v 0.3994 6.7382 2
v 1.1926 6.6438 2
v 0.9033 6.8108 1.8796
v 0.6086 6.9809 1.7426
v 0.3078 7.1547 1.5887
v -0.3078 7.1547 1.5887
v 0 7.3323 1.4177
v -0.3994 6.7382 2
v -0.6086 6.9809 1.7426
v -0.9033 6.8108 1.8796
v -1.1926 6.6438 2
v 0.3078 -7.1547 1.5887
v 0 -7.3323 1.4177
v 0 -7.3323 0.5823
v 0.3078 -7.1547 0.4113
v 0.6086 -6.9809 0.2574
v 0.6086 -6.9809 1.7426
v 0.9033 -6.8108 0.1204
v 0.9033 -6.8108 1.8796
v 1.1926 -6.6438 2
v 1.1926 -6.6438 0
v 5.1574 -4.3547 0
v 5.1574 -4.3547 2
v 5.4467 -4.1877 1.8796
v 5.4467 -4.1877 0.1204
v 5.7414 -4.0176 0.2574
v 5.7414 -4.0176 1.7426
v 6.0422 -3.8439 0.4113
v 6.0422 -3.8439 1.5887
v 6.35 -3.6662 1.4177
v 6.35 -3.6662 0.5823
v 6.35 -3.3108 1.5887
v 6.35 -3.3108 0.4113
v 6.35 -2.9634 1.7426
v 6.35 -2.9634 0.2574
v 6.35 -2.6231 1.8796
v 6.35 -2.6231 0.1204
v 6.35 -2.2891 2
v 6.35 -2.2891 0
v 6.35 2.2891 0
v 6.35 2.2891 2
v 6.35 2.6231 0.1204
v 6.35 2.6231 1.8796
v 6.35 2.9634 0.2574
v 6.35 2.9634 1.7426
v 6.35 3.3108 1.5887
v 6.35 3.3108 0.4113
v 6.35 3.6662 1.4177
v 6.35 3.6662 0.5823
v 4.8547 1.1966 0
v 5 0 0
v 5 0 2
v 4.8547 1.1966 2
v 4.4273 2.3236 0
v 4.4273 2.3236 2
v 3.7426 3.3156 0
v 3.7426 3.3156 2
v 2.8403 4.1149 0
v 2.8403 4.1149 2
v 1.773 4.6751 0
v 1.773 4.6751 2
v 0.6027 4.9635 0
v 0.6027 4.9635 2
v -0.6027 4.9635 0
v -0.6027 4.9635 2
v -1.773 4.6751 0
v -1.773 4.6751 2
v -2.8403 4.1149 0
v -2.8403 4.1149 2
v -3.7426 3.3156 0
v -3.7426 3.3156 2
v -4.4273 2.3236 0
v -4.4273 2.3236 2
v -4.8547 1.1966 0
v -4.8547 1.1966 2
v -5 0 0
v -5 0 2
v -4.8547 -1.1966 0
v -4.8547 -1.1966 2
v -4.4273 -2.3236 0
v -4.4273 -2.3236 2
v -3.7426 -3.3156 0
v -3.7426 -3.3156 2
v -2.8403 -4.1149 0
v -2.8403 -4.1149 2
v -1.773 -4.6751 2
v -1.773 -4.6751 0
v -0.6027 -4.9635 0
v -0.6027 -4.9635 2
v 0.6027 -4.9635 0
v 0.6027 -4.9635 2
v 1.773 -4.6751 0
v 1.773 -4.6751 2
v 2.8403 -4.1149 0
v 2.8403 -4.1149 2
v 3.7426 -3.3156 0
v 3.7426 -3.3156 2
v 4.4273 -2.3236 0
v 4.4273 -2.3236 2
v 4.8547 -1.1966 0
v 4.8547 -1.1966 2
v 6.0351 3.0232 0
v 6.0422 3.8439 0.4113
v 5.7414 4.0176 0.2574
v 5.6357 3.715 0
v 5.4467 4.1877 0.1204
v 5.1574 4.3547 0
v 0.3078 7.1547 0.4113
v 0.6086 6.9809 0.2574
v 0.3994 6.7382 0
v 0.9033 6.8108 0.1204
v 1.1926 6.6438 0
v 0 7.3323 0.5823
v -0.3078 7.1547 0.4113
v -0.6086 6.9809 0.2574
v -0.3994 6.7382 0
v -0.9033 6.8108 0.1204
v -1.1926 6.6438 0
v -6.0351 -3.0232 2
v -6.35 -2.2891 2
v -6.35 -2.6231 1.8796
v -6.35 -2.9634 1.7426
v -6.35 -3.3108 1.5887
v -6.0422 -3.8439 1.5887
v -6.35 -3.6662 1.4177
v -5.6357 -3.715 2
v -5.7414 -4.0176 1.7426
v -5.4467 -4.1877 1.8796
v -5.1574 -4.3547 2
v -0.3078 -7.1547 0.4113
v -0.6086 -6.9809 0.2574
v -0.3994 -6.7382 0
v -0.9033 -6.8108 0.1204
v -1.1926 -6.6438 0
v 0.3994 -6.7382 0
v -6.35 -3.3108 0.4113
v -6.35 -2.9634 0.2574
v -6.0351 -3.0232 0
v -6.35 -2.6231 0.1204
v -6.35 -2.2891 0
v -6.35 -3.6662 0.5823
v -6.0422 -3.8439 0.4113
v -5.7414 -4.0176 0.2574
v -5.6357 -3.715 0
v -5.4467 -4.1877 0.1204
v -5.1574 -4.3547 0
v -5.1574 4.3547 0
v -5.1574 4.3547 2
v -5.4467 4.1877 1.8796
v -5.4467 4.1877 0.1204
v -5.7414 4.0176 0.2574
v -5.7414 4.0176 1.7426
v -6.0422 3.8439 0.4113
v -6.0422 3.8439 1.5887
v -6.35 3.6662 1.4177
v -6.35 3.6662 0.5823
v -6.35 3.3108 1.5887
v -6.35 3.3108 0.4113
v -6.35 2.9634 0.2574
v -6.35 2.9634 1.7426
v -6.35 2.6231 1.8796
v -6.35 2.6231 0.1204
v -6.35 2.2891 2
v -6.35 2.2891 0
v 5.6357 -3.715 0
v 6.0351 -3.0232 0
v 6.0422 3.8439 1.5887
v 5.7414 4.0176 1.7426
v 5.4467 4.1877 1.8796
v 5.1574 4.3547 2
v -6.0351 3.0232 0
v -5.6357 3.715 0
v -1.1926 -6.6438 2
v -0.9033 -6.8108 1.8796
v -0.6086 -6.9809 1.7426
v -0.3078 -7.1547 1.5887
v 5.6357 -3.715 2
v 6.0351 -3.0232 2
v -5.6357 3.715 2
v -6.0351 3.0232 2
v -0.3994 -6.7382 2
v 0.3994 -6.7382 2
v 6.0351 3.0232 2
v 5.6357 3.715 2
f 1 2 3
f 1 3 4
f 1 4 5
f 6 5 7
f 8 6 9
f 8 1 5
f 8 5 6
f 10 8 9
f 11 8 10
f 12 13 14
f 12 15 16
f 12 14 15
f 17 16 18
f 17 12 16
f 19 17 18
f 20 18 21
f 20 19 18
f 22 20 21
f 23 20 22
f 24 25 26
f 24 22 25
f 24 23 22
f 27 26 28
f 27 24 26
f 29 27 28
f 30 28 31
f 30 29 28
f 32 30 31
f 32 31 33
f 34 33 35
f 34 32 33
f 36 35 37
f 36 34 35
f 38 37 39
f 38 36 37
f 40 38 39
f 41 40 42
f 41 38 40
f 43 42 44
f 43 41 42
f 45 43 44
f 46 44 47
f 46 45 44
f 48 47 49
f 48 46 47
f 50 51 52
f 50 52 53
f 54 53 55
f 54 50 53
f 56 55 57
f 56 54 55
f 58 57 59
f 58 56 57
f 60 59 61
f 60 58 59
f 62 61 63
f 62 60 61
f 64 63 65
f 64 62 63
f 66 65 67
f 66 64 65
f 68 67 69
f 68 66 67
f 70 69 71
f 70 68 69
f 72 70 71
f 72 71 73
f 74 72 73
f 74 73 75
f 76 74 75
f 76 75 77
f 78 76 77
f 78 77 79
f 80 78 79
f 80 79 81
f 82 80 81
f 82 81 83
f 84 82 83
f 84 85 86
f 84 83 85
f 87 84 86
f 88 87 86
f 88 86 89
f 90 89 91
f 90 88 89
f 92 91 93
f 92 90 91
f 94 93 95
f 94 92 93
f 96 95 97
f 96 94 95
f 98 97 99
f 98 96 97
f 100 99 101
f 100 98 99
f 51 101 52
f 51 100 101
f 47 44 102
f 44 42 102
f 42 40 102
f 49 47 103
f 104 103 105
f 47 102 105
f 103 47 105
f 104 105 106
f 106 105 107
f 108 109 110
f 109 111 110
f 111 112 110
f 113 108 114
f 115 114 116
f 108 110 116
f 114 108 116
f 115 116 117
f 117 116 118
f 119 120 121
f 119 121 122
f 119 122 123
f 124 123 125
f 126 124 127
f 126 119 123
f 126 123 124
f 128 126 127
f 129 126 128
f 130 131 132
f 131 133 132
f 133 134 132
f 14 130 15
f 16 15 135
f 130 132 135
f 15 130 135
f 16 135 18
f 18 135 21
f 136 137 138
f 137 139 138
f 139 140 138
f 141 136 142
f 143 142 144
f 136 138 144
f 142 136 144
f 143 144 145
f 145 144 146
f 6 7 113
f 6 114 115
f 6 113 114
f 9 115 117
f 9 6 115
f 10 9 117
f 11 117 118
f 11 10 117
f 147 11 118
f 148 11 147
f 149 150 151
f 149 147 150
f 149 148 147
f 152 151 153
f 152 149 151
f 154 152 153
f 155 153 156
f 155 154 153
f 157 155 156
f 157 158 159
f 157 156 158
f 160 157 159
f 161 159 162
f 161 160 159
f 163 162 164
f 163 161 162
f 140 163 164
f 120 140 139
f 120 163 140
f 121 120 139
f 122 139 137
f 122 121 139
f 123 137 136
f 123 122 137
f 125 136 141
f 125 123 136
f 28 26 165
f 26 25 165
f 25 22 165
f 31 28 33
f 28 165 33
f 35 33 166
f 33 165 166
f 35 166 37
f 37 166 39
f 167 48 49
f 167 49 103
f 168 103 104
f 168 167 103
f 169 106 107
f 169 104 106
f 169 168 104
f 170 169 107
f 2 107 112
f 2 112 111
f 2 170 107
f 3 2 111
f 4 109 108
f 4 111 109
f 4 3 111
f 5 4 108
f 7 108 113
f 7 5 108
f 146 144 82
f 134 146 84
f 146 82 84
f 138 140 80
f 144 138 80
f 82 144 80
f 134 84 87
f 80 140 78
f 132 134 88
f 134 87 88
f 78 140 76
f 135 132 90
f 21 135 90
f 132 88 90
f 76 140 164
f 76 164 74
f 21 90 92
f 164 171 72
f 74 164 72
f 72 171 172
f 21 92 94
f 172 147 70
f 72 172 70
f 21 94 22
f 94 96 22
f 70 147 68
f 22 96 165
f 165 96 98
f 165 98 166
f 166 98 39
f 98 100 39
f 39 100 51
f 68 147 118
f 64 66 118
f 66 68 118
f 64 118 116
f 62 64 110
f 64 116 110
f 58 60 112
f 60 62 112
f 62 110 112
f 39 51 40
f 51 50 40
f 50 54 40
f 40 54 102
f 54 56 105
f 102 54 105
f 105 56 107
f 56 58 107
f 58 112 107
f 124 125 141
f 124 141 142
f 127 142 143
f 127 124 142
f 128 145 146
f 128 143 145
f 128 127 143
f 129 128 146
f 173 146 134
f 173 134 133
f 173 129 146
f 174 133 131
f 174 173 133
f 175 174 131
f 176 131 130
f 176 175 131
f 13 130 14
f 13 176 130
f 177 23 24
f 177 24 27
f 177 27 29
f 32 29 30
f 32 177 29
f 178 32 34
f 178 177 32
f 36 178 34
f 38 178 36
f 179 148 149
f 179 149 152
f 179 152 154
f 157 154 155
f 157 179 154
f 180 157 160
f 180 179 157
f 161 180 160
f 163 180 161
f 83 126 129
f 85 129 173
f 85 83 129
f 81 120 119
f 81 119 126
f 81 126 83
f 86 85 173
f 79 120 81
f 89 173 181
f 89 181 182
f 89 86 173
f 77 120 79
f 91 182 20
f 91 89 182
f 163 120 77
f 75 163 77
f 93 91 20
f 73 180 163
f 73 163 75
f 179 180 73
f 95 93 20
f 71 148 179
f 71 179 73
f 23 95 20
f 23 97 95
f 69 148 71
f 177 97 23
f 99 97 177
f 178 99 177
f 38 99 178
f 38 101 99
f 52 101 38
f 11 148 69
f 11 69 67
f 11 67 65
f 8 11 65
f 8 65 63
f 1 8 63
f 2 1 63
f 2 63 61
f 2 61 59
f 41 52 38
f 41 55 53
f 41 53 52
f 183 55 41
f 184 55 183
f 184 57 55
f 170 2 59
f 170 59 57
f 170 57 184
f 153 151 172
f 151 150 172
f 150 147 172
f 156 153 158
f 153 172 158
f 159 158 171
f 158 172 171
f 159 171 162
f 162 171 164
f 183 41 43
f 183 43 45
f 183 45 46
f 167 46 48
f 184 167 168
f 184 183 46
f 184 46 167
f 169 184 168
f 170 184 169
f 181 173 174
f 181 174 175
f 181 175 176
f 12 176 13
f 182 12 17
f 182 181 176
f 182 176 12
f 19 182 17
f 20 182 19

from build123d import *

# Parameters (mm, degrees)
SKETCH018_R          = 7.5
PAD_DEPTH            = 2
CHAMFER_SIZE         = 0.75
CHAMFER001_SIZE      = 0.75
SKETCH019_R          = 8.401279
POCKET015_DEPTH      = 2.001
POCKET015_DEPTH_BACK = 0.001
SKETCH020_R          = 5
POCKET016_DEPTH      = 0.001
POCKET016_DEPTH_BACK = 2.001


with BuildPart() as part:
    # Sketch018 → Pad (new body)
    with BuildSketch(Plane.XY):
        Circle(SKETCH018_R)
    extrude(amount=PAD_DEPTH)

    # Chamfer
    chamfer_edges = [part.edges().sort_by_distance(p)[0] for p in [
        (-7.5, 0, 2),
    ]]
    chamfer(chamfer_edges, length=CHAMFER_SIZE)

    # Chamfer001
    chamfer001_edges = [part.edges().sort_by_distance(p)[0] for p in [
        (-7.5, 0, 0),
    ]]
    chamfer(chamfer001_edges, length=CHAMFER001_SIZE)

    # Sketch019 (on Face3 of Pad) → Pocket015 (cut, two sides)
    with BuildSketch(Plane.XY.offset(2)) as pocket015_sk:
        Circle(SKETCH019_R)
        Polygon((0, 7.332348), (-6.35, 3.666174), (-6.35, -3.666174), (0, -7.332348), (6.35, -3.666174), (6.35, 3.666174), align=None, mode=Mode.SUBTRACT)
    extrude(amount=-POCKET015_DEPTH, mode=Mode.SUBTRACT)
    extrude(pocket015_sk.sketch, amount=POCKET015_DEPTH_BACK, mode=Mode.SUBTRACT)

    # Sketch020 → Pocket016 (cut, two sides)
    with BuildSketch(Plane.XY) as pocket016_sk:
        Circle(SKETCH020_R)
    extrude(amount=-POCKET016_DEPTH, mode=Mode.SUBTRACT)
    extrude(pocket016_sk.sketch, amount=POCKET016_DEPTH_BACK, mode=Mode.SUBTRACT)


solid = part.part
